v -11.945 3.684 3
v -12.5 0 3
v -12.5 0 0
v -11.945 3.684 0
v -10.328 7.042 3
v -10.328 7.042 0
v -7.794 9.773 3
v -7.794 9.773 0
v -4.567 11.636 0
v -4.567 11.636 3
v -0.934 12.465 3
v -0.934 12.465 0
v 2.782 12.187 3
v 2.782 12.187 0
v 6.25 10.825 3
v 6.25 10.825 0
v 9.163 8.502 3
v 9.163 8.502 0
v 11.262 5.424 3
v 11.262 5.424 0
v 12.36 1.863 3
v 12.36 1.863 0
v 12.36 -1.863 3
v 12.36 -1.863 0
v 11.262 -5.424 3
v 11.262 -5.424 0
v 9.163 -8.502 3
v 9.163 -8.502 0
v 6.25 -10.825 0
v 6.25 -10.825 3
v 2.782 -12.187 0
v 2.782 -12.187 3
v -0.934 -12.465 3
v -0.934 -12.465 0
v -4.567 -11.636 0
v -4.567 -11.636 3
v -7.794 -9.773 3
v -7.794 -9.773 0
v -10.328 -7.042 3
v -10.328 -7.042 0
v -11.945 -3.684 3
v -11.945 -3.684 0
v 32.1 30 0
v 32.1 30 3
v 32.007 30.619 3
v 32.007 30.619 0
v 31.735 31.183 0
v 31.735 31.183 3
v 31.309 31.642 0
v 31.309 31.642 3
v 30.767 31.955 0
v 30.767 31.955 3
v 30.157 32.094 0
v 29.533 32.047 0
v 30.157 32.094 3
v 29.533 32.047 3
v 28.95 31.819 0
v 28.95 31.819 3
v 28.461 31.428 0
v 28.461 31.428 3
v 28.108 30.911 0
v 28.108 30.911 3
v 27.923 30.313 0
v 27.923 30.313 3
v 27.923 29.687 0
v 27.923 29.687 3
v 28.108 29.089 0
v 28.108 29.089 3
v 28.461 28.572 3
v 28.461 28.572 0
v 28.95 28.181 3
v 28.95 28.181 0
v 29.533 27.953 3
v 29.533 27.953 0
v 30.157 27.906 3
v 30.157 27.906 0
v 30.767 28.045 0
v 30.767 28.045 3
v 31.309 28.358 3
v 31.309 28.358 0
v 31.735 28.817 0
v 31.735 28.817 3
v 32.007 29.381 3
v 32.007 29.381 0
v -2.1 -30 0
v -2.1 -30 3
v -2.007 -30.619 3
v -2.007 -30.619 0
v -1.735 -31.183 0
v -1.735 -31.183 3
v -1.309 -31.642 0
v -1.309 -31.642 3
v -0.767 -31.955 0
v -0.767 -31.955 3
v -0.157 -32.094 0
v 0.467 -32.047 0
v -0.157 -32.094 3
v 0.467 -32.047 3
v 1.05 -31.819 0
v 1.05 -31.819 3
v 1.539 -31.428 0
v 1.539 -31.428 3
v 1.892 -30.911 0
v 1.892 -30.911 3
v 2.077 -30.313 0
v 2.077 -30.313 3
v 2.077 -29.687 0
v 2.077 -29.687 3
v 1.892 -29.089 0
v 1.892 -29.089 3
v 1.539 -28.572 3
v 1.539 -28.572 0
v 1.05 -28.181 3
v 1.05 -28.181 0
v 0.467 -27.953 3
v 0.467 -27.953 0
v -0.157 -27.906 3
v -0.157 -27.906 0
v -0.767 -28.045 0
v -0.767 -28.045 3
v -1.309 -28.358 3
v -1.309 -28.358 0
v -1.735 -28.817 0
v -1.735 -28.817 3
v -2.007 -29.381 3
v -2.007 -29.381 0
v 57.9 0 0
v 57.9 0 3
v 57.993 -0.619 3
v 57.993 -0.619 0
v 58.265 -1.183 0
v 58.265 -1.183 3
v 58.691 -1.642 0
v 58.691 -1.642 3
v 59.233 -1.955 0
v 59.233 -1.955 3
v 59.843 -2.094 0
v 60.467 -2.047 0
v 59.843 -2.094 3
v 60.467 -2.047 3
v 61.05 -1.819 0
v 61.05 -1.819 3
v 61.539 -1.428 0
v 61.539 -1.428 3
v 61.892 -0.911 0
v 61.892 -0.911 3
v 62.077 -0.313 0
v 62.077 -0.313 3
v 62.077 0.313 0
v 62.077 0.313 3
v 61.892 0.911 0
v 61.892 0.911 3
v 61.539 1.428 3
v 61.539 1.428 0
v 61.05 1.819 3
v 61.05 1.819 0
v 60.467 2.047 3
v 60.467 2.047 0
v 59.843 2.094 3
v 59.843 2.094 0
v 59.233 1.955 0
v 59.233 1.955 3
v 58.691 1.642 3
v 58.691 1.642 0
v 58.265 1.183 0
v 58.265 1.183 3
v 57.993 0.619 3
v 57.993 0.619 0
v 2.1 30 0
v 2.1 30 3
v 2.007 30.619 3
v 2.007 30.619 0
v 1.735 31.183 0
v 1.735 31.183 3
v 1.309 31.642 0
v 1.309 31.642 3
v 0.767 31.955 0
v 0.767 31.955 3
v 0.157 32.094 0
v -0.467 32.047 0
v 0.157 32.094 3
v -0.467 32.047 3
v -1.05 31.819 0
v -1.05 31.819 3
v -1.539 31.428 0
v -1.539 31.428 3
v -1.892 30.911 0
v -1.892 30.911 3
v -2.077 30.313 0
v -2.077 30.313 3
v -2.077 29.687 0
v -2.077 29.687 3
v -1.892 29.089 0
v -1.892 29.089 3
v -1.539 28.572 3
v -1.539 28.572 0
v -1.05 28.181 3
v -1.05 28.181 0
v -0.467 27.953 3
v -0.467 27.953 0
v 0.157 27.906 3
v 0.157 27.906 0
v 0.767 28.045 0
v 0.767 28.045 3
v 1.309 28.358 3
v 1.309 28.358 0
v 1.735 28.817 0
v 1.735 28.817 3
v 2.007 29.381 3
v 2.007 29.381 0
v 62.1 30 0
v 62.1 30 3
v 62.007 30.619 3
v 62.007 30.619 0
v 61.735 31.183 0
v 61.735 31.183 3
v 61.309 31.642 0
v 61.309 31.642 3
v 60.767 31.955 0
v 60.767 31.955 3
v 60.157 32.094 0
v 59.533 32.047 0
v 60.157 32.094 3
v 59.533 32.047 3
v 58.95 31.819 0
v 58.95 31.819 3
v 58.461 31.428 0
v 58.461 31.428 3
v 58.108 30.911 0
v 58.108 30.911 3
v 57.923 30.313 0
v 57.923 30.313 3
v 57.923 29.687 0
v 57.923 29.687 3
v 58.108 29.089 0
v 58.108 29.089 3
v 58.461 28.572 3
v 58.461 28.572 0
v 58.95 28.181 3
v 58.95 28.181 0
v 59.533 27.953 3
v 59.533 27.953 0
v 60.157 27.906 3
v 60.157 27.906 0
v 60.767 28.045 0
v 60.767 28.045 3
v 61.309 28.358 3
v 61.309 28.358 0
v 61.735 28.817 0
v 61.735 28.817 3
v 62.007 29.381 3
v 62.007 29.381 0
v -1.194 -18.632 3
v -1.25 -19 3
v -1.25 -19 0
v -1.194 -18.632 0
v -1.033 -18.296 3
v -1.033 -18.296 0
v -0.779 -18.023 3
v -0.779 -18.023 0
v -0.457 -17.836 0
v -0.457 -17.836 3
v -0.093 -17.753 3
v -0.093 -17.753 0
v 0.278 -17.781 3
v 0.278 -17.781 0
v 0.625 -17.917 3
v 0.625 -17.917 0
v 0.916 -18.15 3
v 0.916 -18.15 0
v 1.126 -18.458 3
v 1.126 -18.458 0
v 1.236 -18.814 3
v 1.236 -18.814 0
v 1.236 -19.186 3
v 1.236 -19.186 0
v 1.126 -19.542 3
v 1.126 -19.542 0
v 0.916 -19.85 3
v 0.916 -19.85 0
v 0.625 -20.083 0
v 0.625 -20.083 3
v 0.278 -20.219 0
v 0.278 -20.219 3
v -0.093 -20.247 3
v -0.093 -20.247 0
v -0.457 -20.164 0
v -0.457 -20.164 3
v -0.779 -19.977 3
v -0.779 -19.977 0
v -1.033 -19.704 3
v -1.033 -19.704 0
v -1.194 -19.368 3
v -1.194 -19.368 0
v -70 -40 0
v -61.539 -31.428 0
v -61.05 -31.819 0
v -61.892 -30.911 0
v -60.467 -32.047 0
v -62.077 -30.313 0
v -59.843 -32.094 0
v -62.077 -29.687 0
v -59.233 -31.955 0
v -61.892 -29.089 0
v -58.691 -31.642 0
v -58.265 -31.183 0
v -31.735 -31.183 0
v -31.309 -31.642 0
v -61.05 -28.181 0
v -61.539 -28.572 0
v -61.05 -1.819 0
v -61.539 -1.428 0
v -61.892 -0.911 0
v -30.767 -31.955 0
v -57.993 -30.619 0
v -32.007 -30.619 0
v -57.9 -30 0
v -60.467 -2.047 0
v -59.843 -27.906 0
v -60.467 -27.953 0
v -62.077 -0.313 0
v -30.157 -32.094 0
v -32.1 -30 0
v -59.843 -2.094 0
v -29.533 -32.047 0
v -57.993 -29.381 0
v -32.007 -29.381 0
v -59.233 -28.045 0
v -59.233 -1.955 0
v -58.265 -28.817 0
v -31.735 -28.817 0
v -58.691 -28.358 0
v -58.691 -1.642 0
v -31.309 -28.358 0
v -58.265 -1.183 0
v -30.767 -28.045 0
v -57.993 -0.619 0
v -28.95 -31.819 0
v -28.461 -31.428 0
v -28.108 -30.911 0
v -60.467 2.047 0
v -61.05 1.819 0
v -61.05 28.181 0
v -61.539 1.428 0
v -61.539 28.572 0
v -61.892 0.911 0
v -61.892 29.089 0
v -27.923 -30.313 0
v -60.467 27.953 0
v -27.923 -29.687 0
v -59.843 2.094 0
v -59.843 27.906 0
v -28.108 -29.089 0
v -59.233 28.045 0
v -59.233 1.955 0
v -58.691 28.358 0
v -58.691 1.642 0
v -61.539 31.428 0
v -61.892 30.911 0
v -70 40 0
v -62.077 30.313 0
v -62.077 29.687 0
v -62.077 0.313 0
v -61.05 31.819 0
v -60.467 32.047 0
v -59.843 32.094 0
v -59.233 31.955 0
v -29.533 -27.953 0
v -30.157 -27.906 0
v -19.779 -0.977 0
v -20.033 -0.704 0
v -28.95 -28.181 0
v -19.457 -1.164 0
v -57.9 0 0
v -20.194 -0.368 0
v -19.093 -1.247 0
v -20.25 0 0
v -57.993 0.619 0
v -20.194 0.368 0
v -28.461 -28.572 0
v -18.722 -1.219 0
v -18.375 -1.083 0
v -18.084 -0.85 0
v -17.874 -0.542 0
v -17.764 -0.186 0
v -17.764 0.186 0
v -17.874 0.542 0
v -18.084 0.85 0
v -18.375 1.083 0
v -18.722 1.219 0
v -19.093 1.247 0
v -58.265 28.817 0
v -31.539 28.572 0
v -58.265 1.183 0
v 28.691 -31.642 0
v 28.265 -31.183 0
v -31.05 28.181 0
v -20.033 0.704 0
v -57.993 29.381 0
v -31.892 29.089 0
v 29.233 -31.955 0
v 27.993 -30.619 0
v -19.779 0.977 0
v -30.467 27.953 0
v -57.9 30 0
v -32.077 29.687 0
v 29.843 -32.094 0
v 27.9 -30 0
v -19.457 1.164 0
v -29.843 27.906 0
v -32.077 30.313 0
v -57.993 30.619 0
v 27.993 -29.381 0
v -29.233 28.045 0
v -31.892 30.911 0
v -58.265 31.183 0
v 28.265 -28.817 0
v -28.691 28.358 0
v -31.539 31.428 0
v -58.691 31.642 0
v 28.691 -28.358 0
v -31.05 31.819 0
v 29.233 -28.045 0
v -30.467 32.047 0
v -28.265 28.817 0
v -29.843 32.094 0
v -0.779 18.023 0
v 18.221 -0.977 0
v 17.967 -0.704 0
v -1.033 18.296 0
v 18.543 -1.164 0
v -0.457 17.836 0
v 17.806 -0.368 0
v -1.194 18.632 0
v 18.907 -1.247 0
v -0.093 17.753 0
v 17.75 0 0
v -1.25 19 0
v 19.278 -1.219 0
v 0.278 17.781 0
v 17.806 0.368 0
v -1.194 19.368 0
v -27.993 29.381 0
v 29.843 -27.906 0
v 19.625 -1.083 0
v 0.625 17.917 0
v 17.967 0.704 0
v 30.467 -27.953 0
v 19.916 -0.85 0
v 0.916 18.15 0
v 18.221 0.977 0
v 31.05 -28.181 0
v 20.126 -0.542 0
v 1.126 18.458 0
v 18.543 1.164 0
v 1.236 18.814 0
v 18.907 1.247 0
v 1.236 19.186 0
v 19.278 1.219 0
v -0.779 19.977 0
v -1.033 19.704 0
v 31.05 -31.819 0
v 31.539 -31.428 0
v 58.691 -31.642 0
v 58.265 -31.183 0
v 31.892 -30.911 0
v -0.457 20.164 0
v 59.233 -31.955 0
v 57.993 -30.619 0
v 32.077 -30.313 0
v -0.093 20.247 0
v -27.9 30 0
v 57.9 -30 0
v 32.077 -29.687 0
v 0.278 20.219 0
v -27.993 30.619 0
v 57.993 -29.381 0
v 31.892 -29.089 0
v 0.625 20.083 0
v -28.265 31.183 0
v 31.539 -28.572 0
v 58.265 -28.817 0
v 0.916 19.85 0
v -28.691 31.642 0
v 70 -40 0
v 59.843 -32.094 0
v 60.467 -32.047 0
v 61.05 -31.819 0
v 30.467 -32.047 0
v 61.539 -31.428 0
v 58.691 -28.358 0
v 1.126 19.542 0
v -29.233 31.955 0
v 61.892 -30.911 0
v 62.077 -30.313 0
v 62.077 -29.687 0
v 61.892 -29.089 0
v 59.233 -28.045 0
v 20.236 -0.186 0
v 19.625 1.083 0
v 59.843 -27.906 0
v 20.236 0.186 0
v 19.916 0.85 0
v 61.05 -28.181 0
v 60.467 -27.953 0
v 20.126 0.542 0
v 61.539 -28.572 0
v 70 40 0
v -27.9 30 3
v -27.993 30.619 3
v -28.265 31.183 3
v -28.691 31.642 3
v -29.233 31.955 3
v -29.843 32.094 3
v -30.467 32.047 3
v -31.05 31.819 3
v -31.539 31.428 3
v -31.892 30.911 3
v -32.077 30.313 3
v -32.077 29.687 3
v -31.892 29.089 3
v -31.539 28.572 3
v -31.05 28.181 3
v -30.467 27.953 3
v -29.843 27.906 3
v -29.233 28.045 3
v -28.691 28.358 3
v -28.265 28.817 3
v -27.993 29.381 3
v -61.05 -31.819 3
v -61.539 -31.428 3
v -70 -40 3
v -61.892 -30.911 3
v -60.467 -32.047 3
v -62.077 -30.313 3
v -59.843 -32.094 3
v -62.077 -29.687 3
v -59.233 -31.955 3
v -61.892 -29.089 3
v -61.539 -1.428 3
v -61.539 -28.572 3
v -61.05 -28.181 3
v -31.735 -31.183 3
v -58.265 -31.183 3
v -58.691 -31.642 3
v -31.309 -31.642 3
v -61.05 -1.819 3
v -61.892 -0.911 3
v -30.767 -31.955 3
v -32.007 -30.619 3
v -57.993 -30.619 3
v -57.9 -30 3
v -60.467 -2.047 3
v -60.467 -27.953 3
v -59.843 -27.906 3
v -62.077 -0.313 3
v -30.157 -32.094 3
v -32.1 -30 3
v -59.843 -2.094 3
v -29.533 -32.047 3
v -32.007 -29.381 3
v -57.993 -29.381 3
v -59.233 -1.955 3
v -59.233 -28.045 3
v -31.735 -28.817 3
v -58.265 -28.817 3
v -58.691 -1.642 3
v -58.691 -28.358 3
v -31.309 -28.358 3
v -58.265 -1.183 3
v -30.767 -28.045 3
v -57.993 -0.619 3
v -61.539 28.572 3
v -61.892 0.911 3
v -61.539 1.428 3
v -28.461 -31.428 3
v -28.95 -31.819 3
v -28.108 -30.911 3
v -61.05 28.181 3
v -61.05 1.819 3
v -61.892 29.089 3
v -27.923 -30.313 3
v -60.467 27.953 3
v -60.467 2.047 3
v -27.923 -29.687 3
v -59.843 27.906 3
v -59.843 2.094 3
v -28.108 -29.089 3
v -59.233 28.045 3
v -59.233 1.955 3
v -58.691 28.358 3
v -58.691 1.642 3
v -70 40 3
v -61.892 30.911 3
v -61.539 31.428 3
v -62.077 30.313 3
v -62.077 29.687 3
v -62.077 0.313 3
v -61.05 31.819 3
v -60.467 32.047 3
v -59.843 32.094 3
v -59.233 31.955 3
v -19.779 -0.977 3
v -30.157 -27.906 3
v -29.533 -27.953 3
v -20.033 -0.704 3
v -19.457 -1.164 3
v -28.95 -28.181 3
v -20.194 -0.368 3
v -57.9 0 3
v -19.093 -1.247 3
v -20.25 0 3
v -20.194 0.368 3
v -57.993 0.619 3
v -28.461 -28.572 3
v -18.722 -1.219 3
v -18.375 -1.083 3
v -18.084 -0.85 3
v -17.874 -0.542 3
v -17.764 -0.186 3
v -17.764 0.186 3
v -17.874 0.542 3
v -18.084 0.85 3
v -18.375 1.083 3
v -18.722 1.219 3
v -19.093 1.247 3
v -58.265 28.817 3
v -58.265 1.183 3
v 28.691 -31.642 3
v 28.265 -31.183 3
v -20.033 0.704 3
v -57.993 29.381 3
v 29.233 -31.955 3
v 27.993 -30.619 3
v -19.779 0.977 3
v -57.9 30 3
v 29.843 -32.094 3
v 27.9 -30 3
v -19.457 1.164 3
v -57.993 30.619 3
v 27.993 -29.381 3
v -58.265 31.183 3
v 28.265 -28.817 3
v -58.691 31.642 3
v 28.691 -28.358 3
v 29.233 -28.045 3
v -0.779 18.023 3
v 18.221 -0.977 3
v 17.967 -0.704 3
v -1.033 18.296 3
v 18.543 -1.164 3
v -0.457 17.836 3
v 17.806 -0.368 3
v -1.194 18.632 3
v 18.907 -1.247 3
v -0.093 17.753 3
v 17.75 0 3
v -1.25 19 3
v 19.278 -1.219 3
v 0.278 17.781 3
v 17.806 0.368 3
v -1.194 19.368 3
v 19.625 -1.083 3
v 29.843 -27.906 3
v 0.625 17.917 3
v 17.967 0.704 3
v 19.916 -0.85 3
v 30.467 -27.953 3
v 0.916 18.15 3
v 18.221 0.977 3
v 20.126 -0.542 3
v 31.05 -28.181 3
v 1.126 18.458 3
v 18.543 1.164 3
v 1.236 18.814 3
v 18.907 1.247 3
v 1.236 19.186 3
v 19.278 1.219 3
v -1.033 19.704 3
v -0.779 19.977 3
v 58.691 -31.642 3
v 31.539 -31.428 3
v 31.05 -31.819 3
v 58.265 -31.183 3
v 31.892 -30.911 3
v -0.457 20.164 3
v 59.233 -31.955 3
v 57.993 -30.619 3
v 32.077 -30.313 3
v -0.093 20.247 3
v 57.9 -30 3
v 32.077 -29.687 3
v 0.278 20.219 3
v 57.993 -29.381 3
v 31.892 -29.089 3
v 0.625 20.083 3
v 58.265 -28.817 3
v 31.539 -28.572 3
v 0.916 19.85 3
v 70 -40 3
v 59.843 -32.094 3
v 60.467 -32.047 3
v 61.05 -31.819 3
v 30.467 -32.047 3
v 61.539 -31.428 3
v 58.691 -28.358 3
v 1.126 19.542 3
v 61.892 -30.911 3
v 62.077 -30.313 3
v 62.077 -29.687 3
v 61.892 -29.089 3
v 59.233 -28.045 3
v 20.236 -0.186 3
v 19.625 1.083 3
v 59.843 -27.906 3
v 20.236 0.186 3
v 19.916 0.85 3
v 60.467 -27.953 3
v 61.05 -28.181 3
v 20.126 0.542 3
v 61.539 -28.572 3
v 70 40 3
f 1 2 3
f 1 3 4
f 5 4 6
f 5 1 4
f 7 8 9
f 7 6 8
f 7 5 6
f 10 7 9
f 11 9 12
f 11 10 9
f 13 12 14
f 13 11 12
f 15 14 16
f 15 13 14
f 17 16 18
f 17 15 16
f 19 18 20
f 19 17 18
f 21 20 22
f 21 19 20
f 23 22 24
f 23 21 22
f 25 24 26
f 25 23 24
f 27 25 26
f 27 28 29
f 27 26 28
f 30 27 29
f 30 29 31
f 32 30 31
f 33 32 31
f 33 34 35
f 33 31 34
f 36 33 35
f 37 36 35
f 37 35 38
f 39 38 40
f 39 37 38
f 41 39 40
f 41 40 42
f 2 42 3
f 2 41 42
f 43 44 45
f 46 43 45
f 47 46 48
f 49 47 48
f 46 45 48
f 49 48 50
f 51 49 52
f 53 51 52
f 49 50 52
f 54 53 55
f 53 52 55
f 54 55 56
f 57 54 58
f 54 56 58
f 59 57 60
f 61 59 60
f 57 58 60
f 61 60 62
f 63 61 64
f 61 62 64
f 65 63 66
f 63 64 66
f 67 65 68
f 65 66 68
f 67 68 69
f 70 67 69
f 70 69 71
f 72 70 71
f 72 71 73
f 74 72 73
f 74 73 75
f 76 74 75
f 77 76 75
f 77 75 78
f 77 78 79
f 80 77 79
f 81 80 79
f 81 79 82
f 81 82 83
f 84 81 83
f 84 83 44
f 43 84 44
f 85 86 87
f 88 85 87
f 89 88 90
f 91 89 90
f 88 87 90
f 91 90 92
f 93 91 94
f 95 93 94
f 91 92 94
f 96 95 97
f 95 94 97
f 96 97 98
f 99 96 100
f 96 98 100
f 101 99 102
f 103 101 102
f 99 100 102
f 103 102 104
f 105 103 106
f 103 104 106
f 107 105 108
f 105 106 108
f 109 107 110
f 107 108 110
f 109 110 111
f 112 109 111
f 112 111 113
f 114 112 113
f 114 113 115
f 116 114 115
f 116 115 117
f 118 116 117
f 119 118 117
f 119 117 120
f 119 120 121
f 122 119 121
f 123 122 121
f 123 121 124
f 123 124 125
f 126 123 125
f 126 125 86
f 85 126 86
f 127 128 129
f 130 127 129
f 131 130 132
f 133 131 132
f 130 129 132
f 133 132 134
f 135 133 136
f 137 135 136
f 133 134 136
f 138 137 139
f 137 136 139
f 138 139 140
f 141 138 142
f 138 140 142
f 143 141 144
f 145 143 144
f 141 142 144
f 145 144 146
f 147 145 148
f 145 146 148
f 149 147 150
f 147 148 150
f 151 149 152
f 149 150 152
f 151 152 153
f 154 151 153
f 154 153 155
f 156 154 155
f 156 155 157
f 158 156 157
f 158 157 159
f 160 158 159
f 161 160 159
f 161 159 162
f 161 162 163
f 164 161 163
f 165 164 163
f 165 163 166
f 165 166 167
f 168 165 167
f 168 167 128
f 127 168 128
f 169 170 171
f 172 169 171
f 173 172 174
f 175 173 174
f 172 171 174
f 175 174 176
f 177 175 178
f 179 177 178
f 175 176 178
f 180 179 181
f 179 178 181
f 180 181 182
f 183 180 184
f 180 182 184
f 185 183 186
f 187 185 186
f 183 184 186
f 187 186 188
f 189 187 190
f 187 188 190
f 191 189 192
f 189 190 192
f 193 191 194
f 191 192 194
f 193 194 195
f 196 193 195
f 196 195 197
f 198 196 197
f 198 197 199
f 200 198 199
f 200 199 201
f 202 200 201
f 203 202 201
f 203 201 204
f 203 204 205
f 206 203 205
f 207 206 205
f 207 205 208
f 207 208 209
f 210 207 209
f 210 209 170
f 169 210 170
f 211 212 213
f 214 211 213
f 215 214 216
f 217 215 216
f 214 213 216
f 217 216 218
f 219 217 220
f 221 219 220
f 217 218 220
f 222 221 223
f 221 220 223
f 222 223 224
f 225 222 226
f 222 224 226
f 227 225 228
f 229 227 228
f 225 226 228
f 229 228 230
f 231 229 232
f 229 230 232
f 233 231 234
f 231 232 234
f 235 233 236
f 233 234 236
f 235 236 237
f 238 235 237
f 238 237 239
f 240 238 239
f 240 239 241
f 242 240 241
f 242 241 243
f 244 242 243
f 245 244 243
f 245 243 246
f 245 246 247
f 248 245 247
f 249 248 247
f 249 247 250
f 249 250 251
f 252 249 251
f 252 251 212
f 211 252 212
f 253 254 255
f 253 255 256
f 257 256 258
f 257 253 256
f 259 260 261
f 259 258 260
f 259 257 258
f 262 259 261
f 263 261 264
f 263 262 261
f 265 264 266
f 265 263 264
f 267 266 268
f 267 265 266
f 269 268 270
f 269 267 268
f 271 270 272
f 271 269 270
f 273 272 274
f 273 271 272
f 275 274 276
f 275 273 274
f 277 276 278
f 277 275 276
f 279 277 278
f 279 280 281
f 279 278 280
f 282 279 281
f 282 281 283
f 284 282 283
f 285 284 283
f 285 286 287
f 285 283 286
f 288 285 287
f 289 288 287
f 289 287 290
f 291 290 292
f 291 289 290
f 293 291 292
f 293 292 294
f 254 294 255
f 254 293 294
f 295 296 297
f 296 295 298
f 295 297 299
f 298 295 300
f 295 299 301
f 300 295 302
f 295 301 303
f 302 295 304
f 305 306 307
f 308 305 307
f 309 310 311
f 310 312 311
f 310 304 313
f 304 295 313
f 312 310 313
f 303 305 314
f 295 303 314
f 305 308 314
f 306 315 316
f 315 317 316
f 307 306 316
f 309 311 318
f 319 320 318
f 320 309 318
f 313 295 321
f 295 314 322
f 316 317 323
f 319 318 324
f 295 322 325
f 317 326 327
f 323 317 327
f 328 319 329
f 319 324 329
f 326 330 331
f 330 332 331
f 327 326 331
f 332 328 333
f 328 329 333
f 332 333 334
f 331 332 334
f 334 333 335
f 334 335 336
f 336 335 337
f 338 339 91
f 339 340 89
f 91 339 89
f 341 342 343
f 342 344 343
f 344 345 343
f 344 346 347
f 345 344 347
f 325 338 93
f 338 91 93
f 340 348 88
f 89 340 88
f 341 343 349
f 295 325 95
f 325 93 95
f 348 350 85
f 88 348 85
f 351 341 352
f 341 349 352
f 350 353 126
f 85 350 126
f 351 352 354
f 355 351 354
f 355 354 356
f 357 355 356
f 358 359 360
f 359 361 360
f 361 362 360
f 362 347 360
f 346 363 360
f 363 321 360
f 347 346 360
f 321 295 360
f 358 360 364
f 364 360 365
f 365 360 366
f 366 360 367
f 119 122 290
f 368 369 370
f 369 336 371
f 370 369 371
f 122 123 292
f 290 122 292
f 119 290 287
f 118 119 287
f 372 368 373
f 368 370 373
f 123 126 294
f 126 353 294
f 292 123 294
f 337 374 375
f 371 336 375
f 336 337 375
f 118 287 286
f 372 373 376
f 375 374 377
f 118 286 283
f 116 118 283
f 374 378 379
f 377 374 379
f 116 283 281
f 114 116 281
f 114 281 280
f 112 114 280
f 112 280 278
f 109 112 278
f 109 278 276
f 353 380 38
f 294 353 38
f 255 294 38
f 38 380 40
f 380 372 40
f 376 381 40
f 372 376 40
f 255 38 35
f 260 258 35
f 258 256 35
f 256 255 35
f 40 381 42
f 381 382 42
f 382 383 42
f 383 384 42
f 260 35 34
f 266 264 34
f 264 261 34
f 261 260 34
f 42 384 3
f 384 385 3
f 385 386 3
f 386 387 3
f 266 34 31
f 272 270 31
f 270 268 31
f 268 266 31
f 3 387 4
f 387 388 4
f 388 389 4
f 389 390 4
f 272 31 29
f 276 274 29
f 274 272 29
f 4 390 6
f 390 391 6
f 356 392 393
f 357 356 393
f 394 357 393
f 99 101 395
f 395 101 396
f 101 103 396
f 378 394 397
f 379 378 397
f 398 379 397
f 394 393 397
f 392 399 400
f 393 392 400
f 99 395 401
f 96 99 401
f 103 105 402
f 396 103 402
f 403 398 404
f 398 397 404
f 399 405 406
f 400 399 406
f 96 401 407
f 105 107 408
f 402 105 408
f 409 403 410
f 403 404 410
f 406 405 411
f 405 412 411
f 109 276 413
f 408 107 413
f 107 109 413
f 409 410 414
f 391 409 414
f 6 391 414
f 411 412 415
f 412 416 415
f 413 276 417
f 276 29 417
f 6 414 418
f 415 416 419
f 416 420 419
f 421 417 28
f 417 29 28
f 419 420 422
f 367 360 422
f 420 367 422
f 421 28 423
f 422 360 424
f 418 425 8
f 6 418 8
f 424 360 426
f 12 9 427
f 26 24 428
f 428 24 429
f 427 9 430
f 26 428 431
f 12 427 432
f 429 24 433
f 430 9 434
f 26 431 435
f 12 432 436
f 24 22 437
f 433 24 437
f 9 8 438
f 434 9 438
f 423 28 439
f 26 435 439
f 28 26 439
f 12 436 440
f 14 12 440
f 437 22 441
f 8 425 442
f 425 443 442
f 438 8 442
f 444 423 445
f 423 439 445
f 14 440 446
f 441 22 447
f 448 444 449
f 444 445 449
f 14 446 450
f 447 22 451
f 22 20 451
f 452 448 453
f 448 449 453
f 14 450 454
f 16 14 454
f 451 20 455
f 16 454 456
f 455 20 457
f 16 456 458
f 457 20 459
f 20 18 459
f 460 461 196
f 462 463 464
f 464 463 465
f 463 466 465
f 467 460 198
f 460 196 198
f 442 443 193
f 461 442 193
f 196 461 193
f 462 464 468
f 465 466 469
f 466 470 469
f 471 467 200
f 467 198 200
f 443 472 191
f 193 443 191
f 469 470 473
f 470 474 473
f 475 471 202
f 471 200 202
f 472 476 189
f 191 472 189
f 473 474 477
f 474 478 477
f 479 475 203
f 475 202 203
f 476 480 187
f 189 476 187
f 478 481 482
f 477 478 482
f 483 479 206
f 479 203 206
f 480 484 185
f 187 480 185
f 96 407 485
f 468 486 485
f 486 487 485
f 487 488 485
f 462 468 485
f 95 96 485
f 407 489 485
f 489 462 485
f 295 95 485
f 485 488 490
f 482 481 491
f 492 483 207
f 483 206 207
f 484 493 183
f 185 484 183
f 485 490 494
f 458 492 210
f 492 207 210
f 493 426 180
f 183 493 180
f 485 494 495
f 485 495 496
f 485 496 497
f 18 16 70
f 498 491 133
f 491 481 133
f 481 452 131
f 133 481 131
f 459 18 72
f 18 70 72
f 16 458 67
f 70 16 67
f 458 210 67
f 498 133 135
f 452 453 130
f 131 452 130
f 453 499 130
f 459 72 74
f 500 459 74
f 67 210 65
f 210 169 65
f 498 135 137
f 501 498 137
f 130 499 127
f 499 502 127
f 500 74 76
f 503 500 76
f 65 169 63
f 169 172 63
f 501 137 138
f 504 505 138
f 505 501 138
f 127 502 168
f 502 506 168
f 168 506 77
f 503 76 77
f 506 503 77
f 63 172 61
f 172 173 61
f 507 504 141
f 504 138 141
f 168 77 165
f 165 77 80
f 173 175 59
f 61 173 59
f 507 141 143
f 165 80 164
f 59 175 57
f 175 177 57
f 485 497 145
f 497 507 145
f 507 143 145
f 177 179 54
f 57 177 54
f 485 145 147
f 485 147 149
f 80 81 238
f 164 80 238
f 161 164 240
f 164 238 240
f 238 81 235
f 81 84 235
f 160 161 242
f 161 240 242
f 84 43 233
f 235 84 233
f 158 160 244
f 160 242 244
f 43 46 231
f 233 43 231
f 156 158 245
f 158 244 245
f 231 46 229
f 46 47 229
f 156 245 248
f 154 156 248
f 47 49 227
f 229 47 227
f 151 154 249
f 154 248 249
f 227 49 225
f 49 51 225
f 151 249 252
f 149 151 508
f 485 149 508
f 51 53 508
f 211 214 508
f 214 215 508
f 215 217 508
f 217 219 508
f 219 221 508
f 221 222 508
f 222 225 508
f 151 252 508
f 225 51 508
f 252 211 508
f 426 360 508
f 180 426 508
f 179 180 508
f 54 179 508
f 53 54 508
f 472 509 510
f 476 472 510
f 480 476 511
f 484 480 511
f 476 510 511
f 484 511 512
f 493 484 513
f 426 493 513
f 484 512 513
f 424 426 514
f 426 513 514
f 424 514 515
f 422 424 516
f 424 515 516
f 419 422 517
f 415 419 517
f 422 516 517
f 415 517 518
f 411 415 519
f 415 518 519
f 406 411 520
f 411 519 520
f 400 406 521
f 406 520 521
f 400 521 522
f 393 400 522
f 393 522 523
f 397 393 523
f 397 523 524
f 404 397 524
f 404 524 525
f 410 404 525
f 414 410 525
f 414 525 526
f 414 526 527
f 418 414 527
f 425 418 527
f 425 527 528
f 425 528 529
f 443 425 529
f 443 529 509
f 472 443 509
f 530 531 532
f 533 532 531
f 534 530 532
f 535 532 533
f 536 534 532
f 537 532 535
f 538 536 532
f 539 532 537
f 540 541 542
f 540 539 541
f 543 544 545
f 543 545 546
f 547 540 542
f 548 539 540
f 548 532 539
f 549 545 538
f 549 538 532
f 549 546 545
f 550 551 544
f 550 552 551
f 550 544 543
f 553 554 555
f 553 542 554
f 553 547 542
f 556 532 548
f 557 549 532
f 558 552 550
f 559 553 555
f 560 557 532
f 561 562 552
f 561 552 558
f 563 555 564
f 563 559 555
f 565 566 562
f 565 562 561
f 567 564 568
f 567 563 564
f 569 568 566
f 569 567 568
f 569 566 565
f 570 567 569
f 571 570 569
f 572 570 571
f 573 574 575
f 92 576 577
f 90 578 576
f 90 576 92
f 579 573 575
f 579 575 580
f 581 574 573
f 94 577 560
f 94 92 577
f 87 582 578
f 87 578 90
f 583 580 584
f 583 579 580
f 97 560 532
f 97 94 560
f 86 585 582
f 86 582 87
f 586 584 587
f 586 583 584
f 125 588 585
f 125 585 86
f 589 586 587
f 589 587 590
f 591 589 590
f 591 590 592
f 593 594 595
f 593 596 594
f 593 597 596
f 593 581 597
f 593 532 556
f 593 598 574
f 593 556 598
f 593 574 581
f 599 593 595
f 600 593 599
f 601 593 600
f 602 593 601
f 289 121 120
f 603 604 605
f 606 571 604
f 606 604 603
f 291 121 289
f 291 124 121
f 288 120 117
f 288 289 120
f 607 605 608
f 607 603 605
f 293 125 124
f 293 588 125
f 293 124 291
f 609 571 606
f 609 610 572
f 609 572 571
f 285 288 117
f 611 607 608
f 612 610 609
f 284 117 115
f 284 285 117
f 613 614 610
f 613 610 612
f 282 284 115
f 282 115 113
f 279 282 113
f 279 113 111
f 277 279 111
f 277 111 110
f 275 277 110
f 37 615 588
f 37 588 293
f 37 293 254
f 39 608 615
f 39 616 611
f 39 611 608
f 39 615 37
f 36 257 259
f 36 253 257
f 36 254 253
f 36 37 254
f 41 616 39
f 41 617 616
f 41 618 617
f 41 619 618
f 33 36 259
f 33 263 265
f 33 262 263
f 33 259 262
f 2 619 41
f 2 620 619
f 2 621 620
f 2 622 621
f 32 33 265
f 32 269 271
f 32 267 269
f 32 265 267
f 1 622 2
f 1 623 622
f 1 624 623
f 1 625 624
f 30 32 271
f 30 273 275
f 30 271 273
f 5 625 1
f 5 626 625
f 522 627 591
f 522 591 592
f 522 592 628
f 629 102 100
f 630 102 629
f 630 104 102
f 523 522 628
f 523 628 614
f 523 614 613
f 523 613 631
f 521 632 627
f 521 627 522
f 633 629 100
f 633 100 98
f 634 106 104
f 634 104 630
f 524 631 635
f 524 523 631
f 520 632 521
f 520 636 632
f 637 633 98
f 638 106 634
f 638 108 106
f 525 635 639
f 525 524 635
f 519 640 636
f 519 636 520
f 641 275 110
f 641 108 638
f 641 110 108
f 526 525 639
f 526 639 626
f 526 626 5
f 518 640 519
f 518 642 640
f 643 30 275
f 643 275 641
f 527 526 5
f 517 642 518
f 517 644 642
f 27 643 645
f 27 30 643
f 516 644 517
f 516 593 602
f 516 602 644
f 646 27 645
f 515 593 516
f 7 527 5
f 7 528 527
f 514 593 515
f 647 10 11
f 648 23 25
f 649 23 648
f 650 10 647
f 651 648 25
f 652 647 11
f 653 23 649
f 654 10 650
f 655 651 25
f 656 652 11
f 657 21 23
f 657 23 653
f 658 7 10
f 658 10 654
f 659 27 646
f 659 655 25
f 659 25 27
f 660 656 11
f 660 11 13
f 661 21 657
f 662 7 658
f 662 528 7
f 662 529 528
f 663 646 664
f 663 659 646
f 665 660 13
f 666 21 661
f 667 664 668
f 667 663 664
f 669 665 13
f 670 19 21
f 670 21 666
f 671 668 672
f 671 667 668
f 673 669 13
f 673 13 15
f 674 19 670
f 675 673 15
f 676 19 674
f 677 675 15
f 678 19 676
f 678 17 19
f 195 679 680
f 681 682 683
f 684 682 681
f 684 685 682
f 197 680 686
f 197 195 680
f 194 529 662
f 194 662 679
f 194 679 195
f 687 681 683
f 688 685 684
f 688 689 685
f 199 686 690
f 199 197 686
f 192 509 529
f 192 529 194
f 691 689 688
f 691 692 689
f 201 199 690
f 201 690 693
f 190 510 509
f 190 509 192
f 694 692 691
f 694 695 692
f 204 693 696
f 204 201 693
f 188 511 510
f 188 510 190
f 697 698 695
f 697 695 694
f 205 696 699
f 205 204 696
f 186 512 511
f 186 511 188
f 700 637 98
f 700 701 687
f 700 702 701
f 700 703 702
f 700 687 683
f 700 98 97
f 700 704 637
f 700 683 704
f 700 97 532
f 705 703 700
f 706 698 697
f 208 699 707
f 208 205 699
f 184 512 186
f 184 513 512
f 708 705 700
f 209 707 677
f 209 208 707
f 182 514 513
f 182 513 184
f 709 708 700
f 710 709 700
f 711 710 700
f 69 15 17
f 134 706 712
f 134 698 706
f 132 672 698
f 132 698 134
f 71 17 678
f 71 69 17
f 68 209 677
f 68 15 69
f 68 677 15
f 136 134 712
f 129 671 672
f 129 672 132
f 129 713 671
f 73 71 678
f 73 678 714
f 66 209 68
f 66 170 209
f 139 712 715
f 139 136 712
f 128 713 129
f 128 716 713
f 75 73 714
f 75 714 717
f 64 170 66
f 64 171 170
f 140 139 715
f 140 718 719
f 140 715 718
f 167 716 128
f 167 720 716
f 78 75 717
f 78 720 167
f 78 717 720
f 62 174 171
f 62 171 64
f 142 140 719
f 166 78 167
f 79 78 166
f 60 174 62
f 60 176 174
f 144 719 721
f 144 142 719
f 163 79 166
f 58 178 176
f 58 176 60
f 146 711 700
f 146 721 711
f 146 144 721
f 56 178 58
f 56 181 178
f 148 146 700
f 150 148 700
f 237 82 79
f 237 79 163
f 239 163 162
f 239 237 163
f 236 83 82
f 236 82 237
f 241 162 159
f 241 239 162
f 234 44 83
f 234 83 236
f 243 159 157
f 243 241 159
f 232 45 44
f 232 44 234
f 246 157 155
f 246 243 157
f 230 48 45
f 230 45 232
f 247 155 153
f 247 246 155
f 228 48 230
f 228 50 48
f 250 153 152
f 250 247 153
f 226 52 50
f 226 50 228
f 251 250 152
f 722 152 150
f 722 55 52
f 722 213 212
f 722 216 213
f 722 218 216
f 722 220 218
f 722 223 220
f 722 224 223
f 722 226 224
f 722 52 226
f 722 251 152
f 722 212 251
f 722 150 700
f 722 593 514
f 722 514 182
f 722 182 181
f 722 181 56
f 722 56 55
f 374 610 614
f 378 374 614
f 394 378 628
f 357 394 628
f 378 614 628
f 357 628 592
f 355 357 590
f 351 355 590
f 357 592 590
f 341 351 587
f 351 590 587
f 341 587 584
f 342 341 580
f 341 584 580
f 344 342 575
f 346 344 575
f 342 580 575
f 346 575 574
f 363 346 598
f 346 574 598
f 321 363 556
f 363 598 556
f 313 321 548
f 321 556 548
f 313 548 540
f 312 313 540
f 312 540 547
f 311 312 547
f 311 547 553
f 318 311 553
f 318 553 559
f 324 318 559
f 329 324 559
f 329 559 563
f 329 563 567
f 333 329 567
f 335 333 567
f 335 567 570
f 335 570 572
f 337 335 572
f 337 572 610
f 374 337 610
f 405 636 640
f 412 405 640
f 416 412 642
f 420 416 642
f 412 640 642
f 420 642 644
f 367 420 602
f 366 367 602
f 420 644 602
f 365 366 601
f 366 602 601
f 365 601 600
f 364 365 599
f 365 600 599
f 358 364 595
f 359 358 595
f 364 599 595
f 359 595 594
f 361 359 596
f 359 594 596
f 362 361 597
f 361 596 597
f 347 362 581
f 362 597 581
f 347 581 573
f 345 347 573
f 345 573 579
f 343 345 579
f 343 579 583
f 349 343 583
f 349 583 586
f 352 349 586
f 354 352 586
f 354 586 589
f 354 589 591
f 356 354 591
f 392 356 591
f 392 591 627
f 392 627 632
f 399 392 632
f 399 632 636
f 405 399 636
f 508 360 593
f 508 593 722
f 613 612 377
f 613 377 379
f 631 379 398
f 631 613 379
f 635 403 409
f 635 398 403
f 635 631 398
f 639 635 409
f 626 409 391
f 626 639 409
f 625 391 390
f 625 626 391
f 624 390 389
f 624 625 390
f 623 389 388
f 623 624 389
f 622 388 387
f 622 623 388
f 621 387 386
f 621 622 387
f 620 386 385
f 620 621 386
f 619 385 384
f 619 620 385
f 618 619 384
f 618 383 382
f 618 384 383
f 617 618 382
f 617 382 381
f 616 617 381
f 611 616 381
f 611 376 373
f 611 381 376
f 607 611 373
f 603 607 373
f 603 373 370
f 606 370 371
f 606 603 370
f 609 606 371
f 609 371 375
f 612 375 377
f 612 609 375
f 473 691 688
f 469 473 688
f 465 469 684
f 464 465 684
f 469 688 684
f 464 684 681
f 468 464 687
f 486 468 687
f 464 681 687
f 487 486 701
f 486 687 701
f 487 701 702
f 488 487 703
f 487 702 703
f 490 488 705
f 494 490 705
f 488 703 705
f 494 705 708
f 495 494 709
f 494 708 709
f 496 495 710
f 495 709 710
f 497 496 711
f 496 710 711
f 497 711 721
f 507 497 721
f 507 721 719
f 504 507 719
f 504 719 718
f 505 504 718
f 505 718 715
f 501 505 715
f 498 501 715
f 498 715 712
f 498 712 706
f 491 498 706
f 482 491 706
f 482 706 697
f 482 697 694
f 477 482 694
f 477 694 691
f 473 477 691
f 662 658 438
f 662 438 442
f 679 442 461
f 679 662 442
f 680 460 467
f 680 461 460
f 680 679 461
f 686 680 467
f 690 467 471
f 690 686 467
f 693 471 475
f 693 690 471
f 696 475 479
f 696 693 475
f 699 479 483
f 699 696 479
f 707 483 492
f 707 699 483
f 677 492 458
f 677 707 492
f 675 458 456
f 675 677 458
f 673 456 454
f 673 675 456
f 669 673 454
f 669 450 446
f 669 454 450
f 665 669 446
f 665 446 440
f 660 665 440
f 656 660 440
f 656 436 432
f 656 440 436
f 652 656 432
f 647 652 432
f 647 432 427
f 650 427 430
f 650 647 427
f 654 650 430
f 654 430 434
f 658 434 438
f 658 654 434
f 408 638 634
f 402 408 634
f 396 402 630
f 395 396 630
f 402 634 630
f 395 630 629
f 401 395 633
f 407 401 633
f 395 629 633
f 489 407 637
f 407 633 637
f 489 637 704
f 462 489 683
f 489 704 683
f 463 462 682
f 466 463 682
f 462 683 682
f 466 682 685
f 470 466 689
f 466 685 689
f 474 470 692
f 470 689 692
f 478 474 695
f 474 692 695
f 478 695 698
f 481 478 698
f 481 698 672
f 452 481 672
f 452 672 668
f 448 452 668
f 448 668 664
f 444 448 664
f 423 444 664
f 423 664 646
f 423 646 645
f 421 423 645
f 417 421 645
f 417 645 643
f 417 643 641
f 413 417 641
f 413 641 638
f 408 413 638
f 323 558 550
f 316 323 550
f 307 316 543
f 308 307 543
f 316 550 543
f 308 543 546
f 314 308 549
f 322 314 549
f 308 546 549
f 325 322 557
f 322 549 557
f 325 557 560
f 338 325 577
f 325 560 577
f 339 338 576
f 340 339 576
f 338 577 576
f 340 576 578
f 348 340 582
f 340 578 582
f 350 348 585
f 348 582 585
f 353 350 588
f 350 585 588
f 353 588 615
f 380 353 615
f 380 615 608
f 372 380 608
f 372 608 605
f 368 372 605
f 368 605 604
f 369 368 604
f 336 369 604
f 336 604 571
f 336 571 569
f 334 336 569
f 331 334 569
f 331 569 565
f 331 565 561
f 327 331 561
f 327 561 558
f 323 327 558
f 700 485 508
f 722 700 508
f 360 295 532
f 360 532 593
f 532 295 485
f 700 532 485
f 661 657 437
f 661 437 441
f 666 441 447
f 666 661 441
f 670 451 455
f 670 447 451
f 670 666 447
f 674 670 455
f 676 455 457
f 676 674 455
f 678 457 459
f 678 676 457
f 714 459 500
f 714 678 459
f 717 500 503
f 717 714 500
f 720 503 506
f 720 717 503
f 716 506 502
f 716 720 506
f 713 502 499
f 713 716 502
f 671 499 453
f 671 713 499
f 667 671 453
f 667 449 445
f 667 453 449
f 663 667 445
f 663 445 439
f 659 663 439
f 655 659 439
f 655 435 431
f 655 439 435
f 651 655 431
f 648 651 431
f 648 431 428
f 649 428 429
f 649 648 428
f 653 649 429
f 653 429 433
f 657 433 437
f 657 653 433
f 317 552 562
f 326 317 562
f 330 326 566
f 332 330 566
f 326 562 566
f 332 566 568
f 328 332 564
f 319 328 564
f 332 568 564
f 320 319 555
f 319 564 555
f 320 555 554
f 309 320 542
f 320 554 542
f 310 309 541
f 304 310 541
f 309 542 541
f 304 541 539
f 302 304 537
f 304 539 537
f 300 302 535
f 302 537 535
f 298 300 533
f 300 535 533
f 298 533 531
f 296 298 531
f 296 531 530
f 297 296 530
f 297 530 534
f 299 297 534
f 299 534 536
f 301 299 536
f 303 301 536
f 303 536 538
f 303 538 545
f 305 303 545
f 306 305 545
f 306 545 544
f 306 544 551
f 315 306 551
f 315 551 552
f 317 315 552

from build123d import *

# Parameters (mm, degrees)
SKETCH_1_W               = 140
SKETCH_1_H               = 80
EXTRUDE_1_DEPTH          = 3
SKETCH_2_R               = 2.1
CUT_EXTRUDE_1_DEPTH      = 81.678373806
CUT_EXTRUDE_2_DEPTH      = 81.678373806
CUT_EXTRUDE_2_DEPTH_BACK = 81.678373806
SKETCH_3_R               = 1.25
CUT_EXTRUDE_3_DEPTH      = 81.678373806
CUT_EXTRUDE_3_DEPTH_BACK = 81.678373806
SKETCH_4_R               = 12.5


with BuildPart() as part:
    # 草图1 → 凸台-拉伸1 (new body)
    with BuildSketch(Plane.XY):
        Rectangle(SKETCH_1_W, SKETCH_1_H)
    extrude(amount=EXTRUDE_1_DEPTH)

    # 草图2 → 切除-拉伸1 (cut, through all)
    with BuildSketch(Plane.XY.offset(3)):
        with Locations((-60, 30)):
            Circle(SKETCH_2_R)
        with Locations((-30, 30)):
            Circle(SKETCH_2_R)
        with Locations((0, 30)):
            Circle(SKETCH_2_R)
        with Locations((30, 30)):
            Circle(SKETCH_2_R)
        with Locations((60, 30)):
            Circle(SKETCH_2_R)
        with Locations((-60, 0)):
            Circle(SKETCH_2_R)
        with Locations((-60, -30)):
            Circle(SKETCH_2_R)
        with Locations((-60, -60)):
            Circle(SKETCH_2_R)
        with Locations((-60, -90)):
            Circle(SKETCH_2_R)
        with Locations((-60, -120)):
            Circle(SKETCH_2_R)
        with Locations((-60, -150)):
            Circle(SKETCH_2_R)
        with Locations((-60, -180)):
            Circle(SKETCH_2_R)
        with Locations((-60, -210)):
            Circle(SKETCH_2_R)
        with Locations((60, -210)):
            Circle(SKETCH_2_R)
        with Locations((60, -180)):
            Circle(SKETCH_2_R)
        with Locations((60, -150)):
            Circle(SKETCH_2_R)
        with Locations((60, -120)):
            Circle(SKETCH_2_R)
        with Locations((60, -90)):
            Circle(SKETCH_2_R)
        with Locations((60, -60)):
            Circle(SKETCH_2_R)
        with Locations(Location((60, -30, 0), (0, 0, 180))):
            Circle(SKETCH_2_R)
        with Locations(Location((60, 0, 0), (0, 0, 180))):
            Circle(SKETCH_2_R)
        with Locations(Location((30, -30, 0), (0, 0, 180))):
            Circle(SKETCH_2_R)
        with Locations(Location((0, -30, 0), (0, 0, 180))):
            Circle(SKETCH_2_R)
        with Locations(Location((-30, -30, 0), (0, 0, 180))):
            Circle(SKETCH_2_R)
    extrude(amount=-CUT_EXTRUDE_1_DEPTH, mode=Mode.SUBTRACT)

    # 草图3 → 切除-拉伸2 (cut, two sides: drawn at the far end of the back side and taken through both)
    with BuildSketch(Plane(origin=(0, 0, 0), x_dir=(-1, 0, 0), z_dir=(0, 0, -1)).offset(-CUT_EXTRUDE_2_DEPTH_BACK)):
        with Locations((19, 0)):
            Circle(SKETCH_3_R)
        with Locations((0, -19)):
            Circle(SKETCH_3_R)
        with Locations((-19, 0)):
            Circle(SKETCH_3_R)
        with Locations((0, 19)):
            Circle(SKETCH_3_R)
    extrude(amount=CUT_EXTRUDE_2_DEPTH + CUT_EXTRUDE_2_DEPTH_BACK, mode=Mode.SUBTRACT)

    # 草图4 → 切除-拉伸3 (cut, two sides: drawn at the far end of the back side and taken through both)
    with BuildSketch(Plane(origin=(0, 0, 0), x_dir=(-1, 0, 0), z_dir=(0, 0, -1)).offset(-CUT_EXTRUDE_3_DEPTH_BACK)):
        Circle(SKETCH_4_R)
    extrude(amount=CUT_EXTRUDE_3_DEPTH + CUT_EXTRUDE_3_DEPTH_BACK, mode=Mode.SUBTRACT)


solid = part.part
